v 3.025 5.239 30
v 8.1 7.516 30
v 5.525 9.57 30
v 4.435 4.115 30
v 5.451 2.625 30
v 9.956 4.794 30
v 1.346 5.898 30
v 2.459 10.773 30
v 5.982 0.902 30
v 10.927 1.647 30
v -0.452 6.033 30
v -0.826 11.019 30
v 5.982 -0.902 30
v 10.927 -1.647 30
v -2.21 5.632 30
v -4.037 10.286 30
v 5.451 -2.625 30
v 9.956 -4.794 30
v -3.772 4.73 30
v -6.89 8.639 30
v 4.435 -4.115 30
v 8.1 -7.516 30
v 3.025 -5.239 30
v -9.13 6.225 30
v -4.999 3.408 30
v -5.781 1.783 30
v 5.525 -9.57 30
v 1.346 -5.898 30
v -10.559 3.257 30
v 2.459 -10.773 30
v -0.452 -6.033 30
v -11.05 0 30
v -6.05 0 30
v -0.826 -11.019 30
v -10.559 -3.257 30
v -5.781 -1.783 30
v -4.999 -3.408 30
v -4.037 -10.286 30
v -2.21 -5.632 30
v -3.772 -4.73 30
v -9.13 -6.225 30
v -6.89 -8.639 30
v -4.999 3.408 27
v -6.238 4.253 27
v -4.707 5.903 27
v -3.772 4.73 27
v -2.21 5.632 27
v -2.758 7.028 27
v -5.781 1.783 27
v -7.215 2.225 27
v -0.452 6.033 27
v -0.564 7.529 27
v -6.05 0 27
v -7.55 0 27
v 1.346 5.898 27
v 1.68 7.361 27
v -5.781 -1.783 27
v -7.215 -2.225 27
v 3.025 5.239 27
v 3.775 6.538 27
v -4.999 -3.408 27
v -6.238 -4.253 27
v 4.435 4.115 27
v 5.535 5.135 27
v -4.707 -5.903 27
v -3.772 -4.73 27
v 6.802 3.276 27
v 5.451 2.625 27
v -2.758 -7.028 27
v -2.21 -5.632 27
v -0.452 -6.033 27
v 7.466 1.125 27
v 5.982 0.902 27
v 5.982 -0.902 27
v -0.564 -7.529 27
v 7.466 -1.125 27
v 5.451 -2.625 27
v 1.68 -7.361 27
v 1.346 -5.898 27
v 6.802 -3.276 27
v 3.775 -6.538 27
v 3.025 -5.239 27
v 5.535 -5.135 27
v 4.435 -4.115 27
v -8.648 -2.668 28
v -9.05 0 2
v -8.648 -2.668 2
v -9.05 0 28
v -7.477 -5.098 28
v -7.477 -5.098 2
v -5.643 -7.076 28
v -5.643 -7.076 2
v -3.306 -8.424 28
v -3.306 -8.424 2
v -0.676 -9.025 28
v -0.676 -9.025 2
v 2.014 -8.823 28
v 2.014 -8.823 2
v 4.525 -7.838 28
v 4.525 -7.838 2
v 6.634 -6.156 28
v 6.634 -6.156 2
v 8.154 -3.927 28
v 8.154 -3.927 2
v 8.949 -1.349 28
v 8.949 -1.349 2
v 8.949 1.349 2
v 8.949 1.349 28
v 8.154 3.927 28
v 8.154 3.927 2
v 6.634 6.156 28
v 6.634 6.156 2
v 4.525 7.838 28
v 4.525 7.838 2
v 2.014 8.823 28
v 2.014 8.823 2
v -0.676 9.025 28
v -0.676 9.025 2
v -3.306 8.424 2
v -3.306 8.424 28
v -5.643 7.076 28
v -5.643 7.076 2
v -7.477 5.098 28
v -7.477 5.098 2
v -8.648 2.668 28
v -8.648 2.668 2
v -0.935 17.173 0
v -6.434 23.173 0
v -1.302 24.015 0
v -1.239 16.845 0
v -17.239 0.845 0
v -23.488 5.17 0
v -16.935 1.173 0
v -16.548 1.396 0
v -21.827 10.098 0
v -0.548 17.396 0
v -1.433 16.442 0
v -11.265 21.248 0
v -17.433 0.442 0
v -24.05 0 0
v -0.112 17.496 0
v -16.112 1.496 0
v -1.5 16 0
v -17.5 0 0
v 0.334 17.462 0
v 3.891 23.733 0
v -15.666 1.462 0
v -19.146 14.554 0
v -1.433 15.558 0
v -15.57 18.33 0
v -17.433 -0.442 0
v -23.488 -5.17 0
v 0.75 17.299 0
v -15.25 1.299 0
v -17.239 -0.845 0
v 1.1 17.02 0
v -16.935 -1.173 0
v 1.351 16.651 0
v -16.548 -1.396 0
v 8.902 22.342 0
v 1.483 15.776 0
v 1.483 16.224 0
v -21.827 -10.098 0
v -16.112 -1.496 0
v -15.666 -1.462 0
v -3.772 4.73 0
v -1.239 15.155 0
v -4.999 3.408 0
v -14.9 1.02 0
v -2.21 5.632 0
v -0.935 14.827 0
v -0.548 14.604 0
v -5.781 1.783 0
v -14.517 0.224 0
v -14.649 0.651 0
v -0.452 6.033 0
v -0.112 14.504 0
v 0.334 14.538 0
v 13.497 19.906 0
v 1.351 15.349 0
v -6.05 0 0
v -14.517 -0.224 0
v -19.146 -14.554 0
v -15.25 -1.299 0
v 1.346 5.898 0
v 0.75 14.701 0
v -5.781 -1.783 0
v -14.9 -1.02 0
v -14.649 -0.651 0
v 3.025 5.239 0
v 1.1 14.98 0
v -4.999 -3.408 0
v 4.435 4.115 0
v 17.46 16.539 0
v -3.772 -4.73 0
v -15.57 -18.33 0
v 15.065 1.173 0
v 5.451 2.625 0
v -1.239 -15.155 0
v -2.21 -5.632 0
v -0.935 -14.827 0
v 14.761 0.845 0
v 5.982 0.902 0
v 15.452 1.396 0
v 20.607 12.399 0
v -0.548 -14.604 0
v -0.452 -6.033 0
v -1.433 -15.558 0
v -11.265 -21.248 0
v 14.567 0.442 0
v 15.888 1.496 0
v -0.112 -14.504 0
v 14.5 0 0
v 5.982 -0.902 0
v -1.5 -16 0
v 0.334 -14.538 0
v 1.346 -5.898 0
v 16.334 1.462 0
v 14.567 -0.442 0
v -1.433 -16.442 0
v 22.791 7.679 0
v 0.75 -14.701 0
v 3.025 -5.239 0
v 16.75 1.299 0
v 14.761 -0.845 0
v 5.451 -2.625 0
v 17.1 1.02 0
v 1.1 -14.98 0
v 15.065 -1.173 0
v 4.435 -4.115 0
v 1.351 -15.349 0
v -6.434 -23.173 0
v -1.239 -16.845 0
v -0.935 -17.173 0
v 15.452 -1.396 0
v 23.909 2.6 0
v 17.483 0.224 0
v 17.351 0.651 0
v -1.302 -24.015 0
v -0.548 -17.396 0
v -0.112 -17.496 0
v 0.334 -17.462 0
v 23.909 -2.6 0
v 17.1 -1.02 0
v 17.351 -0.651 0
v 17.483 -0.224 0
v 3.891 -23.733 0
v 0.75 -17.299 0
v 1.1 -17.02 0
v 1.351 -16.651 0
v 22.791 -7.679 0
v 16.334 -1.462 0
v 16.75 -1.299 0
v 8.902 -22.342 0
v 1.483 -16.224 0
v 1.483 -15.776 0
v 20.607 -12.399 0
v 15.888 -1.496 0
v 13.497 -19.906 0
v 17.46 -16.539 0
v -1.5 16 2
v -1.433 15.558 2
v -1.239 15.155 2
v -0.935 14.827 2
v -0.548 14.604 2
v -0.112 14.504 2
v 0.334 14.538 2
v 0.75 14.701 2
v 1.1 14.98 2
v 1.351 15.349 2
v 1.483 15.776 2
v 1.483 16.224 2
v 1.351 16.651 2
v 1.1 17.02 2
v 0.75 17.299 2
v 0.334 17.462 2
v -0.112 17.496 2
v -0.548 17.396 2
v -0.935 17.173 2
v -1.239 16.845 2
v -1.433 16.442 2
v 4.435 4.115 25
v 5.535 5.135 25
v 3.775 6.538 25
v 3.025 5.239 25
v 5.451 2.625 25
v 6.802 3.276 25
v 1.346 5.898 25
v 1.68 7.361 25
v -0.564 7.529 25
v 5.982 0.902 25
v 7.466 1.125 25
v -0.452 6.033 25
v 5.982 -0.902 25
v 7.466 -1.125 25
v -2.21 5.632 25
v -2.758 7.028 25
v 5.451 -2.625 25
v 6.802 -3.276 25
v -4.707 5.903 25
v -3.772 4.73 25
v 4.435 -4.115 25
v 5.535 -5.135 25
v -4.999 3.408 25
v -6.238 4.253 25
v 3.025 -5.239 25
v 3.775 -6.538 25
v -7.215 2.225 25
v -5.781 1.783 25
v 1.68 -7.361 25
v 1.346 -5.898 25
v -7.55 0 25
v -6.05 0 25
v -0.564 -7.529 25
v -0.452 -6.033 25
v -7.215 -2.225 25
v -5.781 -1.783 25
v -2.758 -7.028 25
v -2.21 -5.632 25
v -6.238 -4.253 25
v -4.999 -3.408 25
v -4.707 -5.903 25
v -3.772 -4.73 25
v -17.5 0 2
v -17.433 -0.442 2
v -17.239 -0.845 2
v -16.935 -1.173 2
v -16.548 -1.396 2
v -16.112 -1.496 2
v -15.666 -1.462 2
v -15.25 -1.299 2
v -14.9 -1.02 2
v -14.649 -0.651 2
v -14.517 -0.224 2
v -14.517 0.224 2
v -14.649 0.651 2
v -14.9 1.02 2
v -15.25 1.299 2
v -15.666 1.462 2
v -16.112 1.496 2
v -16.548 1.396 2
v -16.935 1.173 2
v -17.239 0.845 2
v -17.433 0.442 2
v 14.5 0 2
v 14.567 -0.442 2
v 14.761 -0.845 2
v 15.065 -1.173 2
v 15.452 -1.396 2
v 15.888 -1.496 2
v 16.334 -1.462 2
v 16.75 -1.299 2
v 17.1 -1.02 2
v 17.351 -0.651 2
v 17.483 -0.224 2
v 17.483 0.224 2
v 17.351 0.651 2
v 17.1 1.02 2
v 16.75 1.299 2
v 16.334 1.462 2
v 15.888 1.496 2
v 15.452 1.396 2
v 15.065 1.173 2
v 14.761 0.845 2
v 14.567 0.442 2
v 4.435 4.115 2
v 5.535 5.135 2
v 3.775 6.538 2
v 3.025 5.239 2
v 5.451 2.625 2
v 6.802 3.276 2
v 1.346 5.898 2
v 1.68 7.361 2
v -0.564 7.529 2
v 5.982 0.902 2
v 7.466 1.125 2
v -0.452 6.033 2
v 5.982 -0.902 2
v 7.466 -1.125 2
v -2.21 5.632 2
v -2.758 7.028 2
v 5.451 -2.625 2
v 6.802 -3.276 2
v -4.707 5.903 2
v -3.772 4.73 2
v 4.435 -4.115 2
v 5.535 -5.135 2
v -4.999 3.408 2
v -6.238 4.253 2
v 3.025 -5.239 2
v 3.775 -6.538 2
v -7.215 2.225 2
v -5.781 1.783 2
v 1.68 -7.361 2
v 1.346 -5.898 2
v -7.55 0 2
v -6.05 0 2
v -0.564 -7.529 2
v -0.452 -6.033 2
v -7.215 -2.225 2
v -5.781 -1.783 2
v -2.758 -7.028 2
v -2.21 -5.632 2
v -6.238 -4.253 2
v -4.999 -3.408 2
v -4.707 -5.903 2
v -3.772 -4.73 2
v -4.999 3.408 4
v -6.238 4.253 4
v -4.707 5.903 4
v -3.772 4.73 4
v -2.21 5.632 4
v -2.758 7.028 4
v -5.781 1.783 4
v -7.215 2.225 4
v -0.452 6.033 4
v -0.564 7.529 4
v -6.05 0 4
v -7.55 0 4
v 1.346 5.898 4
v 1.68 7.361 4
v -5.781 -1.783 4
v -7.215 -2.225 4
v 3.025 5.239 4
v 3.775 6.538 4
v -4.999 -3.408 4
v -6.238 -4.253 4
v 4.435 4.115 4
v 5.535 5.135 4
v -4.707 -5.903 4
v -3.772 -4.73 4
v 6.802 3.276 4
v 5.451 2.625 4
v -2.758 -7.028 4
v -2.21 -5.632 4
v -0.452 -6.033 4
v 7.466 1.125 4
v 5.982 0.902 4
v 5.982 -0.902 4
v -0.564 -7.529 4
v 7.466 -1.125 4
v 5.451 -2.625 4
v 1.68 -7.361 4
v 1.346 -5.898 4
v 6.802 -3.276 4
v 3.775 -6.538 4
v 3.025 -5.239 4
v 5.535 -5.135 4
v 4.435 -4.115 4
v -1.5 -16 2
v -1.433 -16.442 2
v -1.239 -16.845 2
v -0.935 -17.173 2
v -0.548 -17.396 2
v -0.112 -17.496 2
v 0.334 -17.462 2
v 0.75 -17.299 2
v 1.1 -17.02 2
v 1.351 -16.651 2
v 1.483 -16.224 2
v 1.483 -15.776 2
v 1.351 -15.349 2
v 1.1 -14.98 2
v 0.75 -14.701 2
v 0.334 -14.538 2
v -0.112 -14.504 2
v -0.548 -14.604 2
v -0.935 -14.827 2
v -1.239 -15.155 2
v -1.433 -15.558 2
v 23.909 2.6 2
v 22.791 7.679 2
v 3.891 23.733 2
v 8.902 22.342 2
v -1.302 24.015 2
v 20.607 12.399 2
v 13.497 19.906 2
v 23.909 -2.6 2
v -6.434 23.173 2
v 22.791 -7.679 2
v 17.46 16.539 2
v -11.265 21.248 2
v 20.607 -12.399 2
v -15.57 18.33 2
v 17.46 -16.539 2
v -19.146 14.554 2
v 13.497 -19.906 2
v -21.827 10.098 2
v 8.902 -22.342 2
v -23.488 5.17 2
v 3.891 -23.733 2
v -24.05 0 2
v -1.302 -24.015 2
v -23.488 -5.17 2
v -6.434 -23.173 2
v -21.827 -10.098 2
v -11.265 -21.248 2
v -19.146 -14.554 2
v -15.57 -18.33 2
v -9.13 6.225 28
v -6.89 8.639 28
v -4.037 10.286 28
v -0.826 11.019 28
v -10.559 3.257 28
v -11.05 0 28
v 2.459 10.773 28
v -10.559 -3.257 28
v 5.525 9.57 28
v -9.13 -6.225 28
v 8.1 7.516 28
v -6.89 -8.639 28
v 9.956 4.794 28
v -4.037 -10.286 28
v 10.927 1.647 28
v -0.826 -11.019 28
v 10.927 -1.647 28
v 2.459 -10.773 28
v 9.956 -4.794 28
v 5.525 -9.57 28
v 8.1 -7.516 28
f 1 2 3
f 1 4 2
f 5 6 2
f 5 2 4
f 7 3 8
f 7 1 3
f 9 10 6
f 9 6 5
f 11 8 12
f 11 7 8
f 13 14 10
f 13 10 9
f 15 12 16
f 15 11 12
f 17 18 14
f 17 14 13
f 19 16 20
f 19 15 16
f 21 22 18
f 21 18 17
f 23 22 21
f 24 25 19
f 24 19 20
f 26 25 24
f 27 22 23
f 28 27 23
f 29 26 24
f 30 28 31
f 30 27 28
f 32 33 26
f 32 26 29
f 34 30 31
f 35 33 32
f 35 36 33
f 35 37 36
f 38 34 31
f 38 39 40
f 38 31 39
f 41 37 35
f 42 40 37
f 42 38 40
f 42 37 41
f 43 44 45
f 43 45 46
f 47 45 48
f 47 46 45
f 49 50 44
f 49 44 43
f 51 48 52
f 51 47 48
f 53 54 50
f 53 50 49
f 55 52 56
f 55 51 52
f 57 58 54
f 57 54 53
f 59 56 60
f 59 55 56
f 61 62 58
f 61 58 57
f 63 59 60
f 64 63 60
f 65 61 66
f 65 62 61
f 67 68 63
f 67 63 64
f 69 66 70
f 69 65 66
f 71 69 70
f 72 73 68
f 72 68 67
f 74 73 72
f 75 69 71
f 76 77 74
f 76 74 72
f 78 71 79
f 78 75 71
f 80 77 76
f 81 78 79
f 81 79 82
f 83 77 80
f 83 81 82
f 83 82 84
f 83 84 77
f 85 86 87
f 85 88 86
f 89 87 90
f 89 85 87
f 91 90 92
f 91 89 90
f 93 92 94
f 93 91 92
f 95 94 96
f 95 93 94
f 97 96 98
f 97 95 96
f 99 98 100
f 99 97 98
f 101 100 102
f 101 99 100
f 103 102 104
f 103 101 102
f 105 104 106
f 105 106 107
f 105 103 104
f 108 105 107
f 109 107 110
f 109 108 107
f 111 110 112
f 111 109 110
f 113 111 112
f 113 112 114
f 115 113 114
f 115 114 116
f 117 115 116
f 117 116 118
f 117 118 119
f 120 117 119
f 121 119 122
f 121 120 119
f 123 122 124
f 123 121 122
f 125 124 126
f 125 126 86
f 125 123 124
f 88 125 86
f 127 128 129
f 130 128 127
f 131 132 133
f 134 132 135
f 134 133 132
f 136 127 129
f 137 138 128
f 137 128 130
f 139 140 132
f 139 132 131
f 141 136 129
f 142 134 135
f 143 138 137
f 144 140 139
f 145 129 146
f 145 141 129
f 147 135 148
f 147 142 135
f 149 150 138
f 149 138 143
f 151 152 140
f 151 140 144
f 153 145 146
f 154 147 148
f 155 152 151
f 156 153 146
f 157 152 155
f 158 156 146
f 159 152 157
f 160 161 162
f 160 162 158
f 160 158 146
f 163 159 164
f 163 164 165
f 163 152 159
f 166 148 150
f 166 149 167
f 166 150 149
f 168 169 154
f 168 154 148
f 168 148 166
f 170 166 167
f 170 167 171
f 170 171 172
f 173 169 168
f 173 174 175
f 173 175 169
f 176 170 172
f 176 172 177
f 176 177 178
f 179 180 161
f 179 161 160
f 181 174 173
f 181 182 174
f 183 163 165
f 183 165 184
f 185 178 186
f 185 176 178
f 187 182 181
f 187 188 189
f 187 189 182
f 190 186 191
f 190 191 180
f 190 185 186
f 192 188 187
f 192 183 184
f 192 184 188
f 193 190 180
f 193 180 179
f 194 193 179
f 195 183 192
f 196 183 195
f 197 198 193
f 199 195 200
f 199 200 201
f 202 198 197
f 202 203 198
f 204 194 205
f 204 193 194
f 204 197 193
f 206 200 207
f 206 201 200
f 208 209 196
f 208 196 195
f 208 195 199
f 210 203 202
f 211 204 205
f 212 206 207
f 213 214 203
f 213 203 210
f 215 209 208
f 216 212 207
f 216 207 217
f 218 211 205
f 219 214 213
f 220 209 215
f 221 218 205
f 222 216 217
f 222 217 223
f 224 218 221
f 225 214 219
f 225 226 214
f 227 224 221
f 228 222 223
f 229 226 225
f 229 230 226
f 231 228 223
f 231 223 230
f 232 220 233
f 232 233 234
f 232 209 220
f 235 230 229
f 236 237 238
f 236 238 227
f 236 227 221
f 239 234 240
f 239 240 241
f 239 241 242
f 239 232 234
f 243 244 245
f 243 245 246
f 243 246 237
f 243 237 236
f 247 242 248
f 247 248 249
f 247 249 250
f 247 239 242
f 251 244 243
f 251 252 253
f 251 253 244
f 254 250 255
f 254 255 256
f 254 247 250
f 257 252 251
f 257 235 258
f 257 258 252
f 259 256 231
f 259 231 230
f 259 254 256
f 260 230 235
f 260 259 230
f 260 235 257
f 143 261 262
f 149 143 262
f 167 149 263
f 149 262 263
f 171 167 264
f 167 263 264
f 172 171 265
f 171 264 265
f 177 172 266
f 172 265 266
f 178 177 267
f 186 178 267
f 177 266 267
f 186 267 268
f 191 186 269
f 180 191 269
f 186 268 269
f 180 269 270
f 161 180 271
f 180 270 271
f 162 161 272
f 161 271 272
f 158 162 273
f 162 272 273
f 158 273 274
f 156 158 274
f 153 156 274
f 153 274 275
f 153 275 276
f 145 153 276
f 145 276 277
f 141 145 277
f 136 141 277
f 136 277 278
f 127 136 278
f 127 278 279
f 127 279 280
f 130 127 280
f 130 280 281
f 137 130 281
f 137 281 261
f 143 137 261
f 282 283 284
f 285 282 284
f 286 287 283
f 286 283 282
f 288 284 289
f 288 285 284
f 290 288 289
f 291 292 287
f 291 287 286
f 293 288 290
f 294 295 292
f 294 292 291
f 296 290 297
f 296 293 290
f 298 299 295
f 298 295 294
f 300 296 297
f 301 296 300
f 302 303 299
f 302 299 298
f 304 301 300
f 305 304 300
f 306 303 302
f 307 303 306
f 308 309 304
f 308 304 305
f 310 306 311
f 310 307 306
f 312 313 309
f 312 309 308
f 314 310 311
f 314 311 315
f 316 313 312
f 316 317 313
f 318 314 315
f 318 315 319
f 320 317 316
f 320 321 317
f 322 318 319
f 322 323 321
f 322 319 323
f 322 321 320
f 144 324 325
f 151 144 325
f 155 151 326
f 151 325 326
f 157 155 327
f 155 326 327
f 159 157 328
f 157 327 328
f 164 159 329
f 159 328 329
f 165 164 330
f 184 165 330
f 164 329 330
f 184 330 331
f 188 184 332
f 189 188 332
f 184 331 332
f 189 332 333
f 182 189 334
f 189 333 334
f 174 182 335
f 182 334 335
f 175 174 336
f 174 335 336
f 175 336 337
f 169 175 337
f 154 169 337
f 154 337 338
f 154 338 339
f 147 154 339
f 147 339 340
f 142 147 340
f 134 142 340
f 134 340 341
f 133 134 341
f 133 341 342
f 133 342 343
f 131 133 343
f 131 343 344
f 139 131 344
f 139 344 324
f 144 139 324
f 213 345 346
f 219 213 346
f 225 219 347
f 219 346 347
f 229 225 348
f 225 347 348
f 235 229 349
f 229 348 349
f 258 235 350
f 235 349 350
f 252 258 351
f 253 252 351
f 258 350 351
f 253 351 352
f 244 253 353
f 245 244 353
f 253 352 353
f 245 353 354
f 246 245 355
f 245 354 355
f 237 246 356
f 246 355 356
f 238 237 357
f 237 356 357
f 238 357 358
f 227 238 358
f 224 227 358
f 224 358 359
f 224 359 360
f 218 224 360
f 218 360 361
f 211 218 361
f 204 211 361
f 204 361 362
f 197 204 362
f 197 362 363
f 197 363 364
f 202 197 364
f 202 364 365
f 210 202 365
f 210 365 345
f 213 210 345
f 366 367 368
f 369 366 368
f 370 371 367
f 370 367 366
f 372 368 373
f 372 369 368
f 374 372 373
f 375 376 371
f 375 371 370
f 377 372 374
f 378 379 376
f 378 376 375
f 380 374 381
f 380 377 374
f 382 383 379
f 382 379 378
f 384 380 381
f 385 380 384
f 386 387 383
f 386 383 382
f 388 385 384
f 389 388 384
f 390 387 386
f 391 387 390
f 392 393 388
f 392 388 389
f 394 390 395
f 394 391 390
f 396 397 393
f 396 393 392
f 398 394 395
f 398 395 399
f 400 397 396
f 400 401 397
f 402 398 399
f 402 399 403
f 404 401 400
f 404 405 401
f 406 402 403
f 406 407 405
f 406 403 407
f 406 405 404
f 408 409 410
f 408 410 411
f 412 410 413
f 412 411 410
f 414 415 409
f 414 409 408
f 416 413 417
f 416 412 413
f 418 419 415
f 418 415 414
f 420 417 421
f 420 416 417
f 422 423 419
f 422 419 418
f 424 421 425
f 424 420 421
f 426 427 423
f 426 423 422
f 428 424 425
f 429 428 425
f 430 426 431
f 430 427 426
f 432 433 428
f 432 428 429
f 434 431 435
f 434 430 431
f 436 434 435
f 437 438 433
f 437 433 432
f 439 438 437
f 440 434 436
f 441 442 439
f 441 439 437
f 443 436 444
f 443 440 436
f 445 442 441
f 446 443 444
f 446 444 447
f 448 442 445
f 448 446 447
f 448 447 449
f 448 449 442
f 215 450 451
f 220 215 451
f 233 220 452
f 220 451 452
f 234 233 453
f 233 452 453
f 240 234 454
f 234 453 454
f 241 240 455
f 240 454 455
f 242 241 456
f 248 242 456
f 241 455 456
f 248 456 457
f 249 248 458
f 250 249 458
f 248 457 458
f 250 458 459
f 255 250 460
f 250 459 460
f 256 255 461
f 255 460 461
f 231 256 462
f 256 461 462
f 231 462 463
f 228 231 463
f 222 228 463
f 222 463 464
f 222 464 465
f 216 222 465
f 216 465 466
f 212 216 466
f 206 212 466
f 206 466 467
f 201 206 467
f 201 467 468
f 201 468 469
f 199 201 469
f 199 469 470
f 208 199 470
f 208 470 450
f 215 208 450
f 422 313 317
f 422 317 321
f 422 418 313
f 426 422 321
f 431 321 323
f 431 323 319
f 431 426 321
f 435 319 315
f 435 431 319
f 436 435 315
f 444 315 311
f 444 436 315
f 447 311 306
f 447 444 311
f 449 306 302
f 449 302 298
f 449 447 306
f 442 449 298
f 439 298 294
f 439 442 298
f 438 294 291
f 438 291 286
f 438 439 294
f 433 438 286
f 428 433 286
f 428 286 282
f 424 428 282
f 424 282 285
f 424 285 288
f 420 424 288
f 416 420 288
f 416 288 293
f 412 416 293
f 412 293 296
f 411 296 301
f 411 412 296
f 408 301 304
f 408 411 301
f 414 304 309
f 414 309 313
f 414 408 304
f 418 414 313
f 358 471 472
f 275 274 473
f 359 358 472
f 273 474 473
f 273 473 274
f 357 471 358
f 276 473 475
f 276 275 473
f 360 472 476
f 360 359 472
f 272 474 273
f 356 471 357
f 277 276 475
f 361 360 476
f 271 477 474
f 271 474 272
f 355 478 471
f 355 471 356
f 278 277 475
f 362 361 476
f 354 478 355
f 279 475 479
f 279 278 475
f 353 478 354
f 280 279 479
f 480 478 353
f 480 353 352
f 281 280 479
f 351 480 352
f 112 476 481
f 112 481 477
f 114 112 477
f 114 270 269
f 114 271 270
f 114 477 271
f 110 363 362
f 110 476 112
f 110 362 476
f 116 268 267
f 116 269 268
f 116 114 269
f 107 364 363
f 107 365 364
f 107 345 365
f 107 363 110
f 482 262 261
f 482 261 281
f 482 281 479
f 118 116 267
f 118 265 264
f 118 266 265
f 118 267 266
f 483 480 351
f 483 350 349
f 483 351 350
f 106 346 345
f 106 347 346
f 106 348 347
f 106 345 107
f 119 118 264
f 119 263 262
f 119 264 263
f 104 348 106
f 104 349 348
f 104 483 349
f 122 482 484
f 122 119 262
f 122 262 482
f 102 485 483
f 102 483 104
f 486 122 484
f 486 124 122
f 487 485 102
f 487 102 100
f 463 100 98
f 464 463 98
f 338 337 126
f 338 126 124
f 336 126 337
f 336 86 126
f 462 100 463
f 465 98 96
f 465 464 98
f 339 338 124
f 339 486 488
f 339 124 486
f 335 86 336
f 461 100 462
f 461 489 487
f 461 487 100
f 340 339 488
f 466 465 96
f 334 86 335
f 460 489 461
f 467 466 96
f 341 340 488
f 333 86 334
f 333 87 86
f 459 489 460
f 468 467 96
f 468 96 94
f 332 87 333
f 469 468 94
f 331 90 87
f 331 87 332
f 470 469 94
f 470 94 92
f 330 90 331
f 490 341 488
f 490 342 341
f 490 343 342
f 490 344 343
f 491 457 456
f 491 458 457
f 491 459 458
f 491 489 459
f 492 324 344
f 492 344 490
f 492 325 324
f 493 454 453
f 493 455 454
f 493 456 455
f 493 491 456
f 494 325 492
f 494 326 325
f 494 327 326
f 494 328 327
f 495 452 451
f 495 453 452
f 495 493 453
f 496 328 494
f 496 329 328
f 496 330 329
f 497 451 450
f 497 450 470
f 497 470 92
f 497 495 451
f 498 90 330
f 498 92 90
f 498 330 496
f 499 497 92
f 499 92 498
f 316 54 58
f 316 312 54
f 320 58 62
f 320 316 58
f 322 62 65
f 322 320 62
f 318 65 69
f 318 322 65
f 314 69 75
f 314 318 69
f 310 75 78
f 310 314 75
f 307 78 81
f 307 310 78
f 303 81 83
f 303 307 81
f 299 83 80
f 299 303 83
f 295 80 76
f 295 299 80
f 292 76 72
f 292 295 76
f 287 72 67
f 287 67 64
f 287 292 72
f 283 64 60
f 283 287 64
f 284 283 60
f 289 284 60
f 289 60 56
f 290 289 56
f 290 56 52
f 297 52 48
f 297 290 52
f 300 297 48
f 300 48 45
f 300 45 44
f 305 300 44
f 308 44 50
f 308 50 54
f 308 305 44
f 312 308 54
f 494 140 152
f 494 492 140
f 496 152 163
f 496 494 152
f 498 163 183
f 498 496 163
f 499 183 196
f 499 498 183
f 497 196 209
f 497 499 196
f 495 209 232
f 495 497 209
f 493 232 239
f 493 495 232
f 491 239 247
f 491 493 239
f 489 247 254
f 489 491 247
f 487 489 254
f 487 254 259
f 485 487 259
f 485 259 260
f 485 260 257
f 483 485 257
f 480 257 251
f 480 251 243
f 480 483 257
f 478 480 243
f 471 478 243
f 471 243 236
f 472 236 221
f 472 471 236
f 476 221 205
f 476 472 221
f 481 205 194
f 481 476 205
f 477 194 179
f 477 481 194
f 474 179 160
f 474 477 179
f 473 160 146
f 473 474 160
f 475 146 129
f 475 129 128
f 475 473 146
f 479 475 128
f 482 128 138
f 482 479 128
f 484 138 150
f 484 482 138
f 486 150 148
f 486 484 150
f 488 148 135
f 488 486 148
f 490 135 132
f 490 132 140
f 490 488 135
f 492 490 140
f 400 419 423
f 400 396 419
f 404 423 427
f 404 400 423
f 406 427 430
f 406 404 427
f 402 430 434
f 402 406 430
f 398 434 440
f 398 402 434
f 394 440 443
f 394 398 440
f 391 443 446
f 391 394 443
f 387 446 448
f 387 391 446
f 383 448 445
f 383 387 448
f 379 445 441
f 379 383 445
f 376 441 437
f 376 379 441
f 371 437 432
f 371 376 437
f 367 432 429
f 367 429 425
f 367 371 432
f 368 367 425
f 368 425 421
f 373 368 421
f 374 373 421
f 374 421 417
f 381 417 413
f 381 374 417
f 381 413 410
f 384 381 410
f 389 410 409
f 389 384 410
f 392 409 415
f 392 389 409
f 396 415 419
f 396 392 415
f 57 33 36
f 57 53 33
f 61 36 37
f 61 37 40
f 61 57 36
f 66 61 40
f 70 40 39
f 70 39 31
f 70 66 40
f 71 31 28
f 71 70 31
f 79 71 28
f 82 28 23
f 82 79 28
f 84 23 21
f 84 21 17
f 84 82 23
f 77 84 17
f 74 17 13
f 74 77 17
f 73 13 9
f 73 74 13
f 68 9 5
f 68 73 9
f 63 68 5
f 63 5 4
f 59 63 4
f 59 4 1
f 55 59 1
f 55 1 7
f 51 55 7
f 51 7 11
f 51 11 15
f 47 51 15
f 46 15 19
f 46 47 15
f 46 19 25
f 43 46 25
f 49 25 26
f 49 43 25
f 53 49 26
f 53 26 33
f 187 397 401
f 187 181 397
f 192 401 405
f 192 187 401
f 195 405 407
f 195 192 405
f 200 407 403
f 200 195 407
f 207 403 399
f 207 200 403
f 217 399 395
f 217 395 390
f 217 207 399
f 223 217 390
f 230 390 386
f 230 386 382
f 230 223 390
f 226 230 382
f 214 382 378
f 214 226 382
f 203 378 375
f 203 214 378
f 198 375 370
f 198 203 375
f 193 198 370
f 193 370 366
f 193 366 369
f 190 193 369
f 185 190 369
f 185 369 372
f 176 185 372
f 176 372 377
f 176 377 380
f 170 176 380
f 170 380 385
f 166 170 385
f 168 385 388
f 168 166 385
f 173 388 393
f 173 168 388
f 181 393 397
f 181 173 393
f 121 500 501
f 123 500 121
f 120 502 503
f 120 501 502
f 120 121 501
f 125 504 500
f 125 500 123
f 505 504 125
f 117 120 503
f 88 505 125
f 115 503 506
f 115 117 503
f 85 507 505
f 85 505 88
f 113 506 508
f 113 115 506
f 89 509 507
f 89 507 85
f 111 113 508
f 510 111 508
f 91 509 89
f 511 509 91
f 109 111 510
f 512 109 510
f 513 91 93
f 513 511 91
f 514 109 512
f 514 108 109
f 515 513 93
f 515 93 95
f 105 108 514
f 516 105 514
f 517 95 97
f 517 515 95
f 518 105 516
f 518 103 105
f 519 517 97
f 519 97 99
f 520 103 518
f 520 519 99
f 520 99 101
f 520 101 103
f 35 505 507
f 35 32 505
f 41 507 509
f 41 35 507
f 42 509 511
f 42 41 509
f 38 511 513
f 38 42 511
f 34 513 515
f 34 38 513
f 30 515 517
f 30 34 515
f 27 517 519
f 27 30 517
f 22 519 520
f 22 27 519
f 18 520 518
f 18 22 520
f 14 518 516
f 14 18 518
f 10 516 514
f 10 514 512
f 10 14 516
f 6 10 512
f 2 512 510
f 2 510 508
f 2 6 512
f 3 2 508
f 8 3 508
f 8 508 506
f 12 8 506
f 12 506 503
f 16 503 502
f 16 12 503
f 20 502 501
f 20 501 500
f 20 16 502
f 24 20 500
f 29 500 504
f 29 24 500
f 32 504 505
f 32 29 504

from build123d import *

# Parameters (mm, degrees)
SKETCH001_R  = 1.5
POCKET_DEPTH = 2.001


with BuildPart() as part:
    # Sketch → Revolution (revolve)
    with BuildSketch(Plane.XZ):
        Polygon((-6.05, 0), (-24.05, 0), (-24.05, 2), (-9.05, 2), (-9.05, 28), (-11.05, 28), (-11.05, 30), (-6.05, 30), (-6.05, 27), (-7.55, 27), (-7.55, 25), (-6.05, 25), (-6.05, 4), (-7.55, 4), (-7.55, 2), (-6.05, 2), align=None)
    revolve(axis=Axis((0, 0, 0), (0, 0, 1)))

    # Sketch001 (on Face3 of Revolution) → Pocket (cut, through all)
    with BuildSketch(Plane(origin=(0, 0, 2), x_dir=(-1, 0, 0), z_dir=(0, 0, 1))):
        with Locations((0, 16)):
            Circle(SKETCH001_R)
        with Locations((0, -16)):
            Circle(SKETCH001_R)
        with Locations((16, 0)):
            Circle(SKETCH001_R)
        with Locations((-16, 0)):
            Circle(SKETCH001_R)
    extrude(amount=-POCKET_DEPTH, mode=Mode.SUBTRACT)


solid = part.part
